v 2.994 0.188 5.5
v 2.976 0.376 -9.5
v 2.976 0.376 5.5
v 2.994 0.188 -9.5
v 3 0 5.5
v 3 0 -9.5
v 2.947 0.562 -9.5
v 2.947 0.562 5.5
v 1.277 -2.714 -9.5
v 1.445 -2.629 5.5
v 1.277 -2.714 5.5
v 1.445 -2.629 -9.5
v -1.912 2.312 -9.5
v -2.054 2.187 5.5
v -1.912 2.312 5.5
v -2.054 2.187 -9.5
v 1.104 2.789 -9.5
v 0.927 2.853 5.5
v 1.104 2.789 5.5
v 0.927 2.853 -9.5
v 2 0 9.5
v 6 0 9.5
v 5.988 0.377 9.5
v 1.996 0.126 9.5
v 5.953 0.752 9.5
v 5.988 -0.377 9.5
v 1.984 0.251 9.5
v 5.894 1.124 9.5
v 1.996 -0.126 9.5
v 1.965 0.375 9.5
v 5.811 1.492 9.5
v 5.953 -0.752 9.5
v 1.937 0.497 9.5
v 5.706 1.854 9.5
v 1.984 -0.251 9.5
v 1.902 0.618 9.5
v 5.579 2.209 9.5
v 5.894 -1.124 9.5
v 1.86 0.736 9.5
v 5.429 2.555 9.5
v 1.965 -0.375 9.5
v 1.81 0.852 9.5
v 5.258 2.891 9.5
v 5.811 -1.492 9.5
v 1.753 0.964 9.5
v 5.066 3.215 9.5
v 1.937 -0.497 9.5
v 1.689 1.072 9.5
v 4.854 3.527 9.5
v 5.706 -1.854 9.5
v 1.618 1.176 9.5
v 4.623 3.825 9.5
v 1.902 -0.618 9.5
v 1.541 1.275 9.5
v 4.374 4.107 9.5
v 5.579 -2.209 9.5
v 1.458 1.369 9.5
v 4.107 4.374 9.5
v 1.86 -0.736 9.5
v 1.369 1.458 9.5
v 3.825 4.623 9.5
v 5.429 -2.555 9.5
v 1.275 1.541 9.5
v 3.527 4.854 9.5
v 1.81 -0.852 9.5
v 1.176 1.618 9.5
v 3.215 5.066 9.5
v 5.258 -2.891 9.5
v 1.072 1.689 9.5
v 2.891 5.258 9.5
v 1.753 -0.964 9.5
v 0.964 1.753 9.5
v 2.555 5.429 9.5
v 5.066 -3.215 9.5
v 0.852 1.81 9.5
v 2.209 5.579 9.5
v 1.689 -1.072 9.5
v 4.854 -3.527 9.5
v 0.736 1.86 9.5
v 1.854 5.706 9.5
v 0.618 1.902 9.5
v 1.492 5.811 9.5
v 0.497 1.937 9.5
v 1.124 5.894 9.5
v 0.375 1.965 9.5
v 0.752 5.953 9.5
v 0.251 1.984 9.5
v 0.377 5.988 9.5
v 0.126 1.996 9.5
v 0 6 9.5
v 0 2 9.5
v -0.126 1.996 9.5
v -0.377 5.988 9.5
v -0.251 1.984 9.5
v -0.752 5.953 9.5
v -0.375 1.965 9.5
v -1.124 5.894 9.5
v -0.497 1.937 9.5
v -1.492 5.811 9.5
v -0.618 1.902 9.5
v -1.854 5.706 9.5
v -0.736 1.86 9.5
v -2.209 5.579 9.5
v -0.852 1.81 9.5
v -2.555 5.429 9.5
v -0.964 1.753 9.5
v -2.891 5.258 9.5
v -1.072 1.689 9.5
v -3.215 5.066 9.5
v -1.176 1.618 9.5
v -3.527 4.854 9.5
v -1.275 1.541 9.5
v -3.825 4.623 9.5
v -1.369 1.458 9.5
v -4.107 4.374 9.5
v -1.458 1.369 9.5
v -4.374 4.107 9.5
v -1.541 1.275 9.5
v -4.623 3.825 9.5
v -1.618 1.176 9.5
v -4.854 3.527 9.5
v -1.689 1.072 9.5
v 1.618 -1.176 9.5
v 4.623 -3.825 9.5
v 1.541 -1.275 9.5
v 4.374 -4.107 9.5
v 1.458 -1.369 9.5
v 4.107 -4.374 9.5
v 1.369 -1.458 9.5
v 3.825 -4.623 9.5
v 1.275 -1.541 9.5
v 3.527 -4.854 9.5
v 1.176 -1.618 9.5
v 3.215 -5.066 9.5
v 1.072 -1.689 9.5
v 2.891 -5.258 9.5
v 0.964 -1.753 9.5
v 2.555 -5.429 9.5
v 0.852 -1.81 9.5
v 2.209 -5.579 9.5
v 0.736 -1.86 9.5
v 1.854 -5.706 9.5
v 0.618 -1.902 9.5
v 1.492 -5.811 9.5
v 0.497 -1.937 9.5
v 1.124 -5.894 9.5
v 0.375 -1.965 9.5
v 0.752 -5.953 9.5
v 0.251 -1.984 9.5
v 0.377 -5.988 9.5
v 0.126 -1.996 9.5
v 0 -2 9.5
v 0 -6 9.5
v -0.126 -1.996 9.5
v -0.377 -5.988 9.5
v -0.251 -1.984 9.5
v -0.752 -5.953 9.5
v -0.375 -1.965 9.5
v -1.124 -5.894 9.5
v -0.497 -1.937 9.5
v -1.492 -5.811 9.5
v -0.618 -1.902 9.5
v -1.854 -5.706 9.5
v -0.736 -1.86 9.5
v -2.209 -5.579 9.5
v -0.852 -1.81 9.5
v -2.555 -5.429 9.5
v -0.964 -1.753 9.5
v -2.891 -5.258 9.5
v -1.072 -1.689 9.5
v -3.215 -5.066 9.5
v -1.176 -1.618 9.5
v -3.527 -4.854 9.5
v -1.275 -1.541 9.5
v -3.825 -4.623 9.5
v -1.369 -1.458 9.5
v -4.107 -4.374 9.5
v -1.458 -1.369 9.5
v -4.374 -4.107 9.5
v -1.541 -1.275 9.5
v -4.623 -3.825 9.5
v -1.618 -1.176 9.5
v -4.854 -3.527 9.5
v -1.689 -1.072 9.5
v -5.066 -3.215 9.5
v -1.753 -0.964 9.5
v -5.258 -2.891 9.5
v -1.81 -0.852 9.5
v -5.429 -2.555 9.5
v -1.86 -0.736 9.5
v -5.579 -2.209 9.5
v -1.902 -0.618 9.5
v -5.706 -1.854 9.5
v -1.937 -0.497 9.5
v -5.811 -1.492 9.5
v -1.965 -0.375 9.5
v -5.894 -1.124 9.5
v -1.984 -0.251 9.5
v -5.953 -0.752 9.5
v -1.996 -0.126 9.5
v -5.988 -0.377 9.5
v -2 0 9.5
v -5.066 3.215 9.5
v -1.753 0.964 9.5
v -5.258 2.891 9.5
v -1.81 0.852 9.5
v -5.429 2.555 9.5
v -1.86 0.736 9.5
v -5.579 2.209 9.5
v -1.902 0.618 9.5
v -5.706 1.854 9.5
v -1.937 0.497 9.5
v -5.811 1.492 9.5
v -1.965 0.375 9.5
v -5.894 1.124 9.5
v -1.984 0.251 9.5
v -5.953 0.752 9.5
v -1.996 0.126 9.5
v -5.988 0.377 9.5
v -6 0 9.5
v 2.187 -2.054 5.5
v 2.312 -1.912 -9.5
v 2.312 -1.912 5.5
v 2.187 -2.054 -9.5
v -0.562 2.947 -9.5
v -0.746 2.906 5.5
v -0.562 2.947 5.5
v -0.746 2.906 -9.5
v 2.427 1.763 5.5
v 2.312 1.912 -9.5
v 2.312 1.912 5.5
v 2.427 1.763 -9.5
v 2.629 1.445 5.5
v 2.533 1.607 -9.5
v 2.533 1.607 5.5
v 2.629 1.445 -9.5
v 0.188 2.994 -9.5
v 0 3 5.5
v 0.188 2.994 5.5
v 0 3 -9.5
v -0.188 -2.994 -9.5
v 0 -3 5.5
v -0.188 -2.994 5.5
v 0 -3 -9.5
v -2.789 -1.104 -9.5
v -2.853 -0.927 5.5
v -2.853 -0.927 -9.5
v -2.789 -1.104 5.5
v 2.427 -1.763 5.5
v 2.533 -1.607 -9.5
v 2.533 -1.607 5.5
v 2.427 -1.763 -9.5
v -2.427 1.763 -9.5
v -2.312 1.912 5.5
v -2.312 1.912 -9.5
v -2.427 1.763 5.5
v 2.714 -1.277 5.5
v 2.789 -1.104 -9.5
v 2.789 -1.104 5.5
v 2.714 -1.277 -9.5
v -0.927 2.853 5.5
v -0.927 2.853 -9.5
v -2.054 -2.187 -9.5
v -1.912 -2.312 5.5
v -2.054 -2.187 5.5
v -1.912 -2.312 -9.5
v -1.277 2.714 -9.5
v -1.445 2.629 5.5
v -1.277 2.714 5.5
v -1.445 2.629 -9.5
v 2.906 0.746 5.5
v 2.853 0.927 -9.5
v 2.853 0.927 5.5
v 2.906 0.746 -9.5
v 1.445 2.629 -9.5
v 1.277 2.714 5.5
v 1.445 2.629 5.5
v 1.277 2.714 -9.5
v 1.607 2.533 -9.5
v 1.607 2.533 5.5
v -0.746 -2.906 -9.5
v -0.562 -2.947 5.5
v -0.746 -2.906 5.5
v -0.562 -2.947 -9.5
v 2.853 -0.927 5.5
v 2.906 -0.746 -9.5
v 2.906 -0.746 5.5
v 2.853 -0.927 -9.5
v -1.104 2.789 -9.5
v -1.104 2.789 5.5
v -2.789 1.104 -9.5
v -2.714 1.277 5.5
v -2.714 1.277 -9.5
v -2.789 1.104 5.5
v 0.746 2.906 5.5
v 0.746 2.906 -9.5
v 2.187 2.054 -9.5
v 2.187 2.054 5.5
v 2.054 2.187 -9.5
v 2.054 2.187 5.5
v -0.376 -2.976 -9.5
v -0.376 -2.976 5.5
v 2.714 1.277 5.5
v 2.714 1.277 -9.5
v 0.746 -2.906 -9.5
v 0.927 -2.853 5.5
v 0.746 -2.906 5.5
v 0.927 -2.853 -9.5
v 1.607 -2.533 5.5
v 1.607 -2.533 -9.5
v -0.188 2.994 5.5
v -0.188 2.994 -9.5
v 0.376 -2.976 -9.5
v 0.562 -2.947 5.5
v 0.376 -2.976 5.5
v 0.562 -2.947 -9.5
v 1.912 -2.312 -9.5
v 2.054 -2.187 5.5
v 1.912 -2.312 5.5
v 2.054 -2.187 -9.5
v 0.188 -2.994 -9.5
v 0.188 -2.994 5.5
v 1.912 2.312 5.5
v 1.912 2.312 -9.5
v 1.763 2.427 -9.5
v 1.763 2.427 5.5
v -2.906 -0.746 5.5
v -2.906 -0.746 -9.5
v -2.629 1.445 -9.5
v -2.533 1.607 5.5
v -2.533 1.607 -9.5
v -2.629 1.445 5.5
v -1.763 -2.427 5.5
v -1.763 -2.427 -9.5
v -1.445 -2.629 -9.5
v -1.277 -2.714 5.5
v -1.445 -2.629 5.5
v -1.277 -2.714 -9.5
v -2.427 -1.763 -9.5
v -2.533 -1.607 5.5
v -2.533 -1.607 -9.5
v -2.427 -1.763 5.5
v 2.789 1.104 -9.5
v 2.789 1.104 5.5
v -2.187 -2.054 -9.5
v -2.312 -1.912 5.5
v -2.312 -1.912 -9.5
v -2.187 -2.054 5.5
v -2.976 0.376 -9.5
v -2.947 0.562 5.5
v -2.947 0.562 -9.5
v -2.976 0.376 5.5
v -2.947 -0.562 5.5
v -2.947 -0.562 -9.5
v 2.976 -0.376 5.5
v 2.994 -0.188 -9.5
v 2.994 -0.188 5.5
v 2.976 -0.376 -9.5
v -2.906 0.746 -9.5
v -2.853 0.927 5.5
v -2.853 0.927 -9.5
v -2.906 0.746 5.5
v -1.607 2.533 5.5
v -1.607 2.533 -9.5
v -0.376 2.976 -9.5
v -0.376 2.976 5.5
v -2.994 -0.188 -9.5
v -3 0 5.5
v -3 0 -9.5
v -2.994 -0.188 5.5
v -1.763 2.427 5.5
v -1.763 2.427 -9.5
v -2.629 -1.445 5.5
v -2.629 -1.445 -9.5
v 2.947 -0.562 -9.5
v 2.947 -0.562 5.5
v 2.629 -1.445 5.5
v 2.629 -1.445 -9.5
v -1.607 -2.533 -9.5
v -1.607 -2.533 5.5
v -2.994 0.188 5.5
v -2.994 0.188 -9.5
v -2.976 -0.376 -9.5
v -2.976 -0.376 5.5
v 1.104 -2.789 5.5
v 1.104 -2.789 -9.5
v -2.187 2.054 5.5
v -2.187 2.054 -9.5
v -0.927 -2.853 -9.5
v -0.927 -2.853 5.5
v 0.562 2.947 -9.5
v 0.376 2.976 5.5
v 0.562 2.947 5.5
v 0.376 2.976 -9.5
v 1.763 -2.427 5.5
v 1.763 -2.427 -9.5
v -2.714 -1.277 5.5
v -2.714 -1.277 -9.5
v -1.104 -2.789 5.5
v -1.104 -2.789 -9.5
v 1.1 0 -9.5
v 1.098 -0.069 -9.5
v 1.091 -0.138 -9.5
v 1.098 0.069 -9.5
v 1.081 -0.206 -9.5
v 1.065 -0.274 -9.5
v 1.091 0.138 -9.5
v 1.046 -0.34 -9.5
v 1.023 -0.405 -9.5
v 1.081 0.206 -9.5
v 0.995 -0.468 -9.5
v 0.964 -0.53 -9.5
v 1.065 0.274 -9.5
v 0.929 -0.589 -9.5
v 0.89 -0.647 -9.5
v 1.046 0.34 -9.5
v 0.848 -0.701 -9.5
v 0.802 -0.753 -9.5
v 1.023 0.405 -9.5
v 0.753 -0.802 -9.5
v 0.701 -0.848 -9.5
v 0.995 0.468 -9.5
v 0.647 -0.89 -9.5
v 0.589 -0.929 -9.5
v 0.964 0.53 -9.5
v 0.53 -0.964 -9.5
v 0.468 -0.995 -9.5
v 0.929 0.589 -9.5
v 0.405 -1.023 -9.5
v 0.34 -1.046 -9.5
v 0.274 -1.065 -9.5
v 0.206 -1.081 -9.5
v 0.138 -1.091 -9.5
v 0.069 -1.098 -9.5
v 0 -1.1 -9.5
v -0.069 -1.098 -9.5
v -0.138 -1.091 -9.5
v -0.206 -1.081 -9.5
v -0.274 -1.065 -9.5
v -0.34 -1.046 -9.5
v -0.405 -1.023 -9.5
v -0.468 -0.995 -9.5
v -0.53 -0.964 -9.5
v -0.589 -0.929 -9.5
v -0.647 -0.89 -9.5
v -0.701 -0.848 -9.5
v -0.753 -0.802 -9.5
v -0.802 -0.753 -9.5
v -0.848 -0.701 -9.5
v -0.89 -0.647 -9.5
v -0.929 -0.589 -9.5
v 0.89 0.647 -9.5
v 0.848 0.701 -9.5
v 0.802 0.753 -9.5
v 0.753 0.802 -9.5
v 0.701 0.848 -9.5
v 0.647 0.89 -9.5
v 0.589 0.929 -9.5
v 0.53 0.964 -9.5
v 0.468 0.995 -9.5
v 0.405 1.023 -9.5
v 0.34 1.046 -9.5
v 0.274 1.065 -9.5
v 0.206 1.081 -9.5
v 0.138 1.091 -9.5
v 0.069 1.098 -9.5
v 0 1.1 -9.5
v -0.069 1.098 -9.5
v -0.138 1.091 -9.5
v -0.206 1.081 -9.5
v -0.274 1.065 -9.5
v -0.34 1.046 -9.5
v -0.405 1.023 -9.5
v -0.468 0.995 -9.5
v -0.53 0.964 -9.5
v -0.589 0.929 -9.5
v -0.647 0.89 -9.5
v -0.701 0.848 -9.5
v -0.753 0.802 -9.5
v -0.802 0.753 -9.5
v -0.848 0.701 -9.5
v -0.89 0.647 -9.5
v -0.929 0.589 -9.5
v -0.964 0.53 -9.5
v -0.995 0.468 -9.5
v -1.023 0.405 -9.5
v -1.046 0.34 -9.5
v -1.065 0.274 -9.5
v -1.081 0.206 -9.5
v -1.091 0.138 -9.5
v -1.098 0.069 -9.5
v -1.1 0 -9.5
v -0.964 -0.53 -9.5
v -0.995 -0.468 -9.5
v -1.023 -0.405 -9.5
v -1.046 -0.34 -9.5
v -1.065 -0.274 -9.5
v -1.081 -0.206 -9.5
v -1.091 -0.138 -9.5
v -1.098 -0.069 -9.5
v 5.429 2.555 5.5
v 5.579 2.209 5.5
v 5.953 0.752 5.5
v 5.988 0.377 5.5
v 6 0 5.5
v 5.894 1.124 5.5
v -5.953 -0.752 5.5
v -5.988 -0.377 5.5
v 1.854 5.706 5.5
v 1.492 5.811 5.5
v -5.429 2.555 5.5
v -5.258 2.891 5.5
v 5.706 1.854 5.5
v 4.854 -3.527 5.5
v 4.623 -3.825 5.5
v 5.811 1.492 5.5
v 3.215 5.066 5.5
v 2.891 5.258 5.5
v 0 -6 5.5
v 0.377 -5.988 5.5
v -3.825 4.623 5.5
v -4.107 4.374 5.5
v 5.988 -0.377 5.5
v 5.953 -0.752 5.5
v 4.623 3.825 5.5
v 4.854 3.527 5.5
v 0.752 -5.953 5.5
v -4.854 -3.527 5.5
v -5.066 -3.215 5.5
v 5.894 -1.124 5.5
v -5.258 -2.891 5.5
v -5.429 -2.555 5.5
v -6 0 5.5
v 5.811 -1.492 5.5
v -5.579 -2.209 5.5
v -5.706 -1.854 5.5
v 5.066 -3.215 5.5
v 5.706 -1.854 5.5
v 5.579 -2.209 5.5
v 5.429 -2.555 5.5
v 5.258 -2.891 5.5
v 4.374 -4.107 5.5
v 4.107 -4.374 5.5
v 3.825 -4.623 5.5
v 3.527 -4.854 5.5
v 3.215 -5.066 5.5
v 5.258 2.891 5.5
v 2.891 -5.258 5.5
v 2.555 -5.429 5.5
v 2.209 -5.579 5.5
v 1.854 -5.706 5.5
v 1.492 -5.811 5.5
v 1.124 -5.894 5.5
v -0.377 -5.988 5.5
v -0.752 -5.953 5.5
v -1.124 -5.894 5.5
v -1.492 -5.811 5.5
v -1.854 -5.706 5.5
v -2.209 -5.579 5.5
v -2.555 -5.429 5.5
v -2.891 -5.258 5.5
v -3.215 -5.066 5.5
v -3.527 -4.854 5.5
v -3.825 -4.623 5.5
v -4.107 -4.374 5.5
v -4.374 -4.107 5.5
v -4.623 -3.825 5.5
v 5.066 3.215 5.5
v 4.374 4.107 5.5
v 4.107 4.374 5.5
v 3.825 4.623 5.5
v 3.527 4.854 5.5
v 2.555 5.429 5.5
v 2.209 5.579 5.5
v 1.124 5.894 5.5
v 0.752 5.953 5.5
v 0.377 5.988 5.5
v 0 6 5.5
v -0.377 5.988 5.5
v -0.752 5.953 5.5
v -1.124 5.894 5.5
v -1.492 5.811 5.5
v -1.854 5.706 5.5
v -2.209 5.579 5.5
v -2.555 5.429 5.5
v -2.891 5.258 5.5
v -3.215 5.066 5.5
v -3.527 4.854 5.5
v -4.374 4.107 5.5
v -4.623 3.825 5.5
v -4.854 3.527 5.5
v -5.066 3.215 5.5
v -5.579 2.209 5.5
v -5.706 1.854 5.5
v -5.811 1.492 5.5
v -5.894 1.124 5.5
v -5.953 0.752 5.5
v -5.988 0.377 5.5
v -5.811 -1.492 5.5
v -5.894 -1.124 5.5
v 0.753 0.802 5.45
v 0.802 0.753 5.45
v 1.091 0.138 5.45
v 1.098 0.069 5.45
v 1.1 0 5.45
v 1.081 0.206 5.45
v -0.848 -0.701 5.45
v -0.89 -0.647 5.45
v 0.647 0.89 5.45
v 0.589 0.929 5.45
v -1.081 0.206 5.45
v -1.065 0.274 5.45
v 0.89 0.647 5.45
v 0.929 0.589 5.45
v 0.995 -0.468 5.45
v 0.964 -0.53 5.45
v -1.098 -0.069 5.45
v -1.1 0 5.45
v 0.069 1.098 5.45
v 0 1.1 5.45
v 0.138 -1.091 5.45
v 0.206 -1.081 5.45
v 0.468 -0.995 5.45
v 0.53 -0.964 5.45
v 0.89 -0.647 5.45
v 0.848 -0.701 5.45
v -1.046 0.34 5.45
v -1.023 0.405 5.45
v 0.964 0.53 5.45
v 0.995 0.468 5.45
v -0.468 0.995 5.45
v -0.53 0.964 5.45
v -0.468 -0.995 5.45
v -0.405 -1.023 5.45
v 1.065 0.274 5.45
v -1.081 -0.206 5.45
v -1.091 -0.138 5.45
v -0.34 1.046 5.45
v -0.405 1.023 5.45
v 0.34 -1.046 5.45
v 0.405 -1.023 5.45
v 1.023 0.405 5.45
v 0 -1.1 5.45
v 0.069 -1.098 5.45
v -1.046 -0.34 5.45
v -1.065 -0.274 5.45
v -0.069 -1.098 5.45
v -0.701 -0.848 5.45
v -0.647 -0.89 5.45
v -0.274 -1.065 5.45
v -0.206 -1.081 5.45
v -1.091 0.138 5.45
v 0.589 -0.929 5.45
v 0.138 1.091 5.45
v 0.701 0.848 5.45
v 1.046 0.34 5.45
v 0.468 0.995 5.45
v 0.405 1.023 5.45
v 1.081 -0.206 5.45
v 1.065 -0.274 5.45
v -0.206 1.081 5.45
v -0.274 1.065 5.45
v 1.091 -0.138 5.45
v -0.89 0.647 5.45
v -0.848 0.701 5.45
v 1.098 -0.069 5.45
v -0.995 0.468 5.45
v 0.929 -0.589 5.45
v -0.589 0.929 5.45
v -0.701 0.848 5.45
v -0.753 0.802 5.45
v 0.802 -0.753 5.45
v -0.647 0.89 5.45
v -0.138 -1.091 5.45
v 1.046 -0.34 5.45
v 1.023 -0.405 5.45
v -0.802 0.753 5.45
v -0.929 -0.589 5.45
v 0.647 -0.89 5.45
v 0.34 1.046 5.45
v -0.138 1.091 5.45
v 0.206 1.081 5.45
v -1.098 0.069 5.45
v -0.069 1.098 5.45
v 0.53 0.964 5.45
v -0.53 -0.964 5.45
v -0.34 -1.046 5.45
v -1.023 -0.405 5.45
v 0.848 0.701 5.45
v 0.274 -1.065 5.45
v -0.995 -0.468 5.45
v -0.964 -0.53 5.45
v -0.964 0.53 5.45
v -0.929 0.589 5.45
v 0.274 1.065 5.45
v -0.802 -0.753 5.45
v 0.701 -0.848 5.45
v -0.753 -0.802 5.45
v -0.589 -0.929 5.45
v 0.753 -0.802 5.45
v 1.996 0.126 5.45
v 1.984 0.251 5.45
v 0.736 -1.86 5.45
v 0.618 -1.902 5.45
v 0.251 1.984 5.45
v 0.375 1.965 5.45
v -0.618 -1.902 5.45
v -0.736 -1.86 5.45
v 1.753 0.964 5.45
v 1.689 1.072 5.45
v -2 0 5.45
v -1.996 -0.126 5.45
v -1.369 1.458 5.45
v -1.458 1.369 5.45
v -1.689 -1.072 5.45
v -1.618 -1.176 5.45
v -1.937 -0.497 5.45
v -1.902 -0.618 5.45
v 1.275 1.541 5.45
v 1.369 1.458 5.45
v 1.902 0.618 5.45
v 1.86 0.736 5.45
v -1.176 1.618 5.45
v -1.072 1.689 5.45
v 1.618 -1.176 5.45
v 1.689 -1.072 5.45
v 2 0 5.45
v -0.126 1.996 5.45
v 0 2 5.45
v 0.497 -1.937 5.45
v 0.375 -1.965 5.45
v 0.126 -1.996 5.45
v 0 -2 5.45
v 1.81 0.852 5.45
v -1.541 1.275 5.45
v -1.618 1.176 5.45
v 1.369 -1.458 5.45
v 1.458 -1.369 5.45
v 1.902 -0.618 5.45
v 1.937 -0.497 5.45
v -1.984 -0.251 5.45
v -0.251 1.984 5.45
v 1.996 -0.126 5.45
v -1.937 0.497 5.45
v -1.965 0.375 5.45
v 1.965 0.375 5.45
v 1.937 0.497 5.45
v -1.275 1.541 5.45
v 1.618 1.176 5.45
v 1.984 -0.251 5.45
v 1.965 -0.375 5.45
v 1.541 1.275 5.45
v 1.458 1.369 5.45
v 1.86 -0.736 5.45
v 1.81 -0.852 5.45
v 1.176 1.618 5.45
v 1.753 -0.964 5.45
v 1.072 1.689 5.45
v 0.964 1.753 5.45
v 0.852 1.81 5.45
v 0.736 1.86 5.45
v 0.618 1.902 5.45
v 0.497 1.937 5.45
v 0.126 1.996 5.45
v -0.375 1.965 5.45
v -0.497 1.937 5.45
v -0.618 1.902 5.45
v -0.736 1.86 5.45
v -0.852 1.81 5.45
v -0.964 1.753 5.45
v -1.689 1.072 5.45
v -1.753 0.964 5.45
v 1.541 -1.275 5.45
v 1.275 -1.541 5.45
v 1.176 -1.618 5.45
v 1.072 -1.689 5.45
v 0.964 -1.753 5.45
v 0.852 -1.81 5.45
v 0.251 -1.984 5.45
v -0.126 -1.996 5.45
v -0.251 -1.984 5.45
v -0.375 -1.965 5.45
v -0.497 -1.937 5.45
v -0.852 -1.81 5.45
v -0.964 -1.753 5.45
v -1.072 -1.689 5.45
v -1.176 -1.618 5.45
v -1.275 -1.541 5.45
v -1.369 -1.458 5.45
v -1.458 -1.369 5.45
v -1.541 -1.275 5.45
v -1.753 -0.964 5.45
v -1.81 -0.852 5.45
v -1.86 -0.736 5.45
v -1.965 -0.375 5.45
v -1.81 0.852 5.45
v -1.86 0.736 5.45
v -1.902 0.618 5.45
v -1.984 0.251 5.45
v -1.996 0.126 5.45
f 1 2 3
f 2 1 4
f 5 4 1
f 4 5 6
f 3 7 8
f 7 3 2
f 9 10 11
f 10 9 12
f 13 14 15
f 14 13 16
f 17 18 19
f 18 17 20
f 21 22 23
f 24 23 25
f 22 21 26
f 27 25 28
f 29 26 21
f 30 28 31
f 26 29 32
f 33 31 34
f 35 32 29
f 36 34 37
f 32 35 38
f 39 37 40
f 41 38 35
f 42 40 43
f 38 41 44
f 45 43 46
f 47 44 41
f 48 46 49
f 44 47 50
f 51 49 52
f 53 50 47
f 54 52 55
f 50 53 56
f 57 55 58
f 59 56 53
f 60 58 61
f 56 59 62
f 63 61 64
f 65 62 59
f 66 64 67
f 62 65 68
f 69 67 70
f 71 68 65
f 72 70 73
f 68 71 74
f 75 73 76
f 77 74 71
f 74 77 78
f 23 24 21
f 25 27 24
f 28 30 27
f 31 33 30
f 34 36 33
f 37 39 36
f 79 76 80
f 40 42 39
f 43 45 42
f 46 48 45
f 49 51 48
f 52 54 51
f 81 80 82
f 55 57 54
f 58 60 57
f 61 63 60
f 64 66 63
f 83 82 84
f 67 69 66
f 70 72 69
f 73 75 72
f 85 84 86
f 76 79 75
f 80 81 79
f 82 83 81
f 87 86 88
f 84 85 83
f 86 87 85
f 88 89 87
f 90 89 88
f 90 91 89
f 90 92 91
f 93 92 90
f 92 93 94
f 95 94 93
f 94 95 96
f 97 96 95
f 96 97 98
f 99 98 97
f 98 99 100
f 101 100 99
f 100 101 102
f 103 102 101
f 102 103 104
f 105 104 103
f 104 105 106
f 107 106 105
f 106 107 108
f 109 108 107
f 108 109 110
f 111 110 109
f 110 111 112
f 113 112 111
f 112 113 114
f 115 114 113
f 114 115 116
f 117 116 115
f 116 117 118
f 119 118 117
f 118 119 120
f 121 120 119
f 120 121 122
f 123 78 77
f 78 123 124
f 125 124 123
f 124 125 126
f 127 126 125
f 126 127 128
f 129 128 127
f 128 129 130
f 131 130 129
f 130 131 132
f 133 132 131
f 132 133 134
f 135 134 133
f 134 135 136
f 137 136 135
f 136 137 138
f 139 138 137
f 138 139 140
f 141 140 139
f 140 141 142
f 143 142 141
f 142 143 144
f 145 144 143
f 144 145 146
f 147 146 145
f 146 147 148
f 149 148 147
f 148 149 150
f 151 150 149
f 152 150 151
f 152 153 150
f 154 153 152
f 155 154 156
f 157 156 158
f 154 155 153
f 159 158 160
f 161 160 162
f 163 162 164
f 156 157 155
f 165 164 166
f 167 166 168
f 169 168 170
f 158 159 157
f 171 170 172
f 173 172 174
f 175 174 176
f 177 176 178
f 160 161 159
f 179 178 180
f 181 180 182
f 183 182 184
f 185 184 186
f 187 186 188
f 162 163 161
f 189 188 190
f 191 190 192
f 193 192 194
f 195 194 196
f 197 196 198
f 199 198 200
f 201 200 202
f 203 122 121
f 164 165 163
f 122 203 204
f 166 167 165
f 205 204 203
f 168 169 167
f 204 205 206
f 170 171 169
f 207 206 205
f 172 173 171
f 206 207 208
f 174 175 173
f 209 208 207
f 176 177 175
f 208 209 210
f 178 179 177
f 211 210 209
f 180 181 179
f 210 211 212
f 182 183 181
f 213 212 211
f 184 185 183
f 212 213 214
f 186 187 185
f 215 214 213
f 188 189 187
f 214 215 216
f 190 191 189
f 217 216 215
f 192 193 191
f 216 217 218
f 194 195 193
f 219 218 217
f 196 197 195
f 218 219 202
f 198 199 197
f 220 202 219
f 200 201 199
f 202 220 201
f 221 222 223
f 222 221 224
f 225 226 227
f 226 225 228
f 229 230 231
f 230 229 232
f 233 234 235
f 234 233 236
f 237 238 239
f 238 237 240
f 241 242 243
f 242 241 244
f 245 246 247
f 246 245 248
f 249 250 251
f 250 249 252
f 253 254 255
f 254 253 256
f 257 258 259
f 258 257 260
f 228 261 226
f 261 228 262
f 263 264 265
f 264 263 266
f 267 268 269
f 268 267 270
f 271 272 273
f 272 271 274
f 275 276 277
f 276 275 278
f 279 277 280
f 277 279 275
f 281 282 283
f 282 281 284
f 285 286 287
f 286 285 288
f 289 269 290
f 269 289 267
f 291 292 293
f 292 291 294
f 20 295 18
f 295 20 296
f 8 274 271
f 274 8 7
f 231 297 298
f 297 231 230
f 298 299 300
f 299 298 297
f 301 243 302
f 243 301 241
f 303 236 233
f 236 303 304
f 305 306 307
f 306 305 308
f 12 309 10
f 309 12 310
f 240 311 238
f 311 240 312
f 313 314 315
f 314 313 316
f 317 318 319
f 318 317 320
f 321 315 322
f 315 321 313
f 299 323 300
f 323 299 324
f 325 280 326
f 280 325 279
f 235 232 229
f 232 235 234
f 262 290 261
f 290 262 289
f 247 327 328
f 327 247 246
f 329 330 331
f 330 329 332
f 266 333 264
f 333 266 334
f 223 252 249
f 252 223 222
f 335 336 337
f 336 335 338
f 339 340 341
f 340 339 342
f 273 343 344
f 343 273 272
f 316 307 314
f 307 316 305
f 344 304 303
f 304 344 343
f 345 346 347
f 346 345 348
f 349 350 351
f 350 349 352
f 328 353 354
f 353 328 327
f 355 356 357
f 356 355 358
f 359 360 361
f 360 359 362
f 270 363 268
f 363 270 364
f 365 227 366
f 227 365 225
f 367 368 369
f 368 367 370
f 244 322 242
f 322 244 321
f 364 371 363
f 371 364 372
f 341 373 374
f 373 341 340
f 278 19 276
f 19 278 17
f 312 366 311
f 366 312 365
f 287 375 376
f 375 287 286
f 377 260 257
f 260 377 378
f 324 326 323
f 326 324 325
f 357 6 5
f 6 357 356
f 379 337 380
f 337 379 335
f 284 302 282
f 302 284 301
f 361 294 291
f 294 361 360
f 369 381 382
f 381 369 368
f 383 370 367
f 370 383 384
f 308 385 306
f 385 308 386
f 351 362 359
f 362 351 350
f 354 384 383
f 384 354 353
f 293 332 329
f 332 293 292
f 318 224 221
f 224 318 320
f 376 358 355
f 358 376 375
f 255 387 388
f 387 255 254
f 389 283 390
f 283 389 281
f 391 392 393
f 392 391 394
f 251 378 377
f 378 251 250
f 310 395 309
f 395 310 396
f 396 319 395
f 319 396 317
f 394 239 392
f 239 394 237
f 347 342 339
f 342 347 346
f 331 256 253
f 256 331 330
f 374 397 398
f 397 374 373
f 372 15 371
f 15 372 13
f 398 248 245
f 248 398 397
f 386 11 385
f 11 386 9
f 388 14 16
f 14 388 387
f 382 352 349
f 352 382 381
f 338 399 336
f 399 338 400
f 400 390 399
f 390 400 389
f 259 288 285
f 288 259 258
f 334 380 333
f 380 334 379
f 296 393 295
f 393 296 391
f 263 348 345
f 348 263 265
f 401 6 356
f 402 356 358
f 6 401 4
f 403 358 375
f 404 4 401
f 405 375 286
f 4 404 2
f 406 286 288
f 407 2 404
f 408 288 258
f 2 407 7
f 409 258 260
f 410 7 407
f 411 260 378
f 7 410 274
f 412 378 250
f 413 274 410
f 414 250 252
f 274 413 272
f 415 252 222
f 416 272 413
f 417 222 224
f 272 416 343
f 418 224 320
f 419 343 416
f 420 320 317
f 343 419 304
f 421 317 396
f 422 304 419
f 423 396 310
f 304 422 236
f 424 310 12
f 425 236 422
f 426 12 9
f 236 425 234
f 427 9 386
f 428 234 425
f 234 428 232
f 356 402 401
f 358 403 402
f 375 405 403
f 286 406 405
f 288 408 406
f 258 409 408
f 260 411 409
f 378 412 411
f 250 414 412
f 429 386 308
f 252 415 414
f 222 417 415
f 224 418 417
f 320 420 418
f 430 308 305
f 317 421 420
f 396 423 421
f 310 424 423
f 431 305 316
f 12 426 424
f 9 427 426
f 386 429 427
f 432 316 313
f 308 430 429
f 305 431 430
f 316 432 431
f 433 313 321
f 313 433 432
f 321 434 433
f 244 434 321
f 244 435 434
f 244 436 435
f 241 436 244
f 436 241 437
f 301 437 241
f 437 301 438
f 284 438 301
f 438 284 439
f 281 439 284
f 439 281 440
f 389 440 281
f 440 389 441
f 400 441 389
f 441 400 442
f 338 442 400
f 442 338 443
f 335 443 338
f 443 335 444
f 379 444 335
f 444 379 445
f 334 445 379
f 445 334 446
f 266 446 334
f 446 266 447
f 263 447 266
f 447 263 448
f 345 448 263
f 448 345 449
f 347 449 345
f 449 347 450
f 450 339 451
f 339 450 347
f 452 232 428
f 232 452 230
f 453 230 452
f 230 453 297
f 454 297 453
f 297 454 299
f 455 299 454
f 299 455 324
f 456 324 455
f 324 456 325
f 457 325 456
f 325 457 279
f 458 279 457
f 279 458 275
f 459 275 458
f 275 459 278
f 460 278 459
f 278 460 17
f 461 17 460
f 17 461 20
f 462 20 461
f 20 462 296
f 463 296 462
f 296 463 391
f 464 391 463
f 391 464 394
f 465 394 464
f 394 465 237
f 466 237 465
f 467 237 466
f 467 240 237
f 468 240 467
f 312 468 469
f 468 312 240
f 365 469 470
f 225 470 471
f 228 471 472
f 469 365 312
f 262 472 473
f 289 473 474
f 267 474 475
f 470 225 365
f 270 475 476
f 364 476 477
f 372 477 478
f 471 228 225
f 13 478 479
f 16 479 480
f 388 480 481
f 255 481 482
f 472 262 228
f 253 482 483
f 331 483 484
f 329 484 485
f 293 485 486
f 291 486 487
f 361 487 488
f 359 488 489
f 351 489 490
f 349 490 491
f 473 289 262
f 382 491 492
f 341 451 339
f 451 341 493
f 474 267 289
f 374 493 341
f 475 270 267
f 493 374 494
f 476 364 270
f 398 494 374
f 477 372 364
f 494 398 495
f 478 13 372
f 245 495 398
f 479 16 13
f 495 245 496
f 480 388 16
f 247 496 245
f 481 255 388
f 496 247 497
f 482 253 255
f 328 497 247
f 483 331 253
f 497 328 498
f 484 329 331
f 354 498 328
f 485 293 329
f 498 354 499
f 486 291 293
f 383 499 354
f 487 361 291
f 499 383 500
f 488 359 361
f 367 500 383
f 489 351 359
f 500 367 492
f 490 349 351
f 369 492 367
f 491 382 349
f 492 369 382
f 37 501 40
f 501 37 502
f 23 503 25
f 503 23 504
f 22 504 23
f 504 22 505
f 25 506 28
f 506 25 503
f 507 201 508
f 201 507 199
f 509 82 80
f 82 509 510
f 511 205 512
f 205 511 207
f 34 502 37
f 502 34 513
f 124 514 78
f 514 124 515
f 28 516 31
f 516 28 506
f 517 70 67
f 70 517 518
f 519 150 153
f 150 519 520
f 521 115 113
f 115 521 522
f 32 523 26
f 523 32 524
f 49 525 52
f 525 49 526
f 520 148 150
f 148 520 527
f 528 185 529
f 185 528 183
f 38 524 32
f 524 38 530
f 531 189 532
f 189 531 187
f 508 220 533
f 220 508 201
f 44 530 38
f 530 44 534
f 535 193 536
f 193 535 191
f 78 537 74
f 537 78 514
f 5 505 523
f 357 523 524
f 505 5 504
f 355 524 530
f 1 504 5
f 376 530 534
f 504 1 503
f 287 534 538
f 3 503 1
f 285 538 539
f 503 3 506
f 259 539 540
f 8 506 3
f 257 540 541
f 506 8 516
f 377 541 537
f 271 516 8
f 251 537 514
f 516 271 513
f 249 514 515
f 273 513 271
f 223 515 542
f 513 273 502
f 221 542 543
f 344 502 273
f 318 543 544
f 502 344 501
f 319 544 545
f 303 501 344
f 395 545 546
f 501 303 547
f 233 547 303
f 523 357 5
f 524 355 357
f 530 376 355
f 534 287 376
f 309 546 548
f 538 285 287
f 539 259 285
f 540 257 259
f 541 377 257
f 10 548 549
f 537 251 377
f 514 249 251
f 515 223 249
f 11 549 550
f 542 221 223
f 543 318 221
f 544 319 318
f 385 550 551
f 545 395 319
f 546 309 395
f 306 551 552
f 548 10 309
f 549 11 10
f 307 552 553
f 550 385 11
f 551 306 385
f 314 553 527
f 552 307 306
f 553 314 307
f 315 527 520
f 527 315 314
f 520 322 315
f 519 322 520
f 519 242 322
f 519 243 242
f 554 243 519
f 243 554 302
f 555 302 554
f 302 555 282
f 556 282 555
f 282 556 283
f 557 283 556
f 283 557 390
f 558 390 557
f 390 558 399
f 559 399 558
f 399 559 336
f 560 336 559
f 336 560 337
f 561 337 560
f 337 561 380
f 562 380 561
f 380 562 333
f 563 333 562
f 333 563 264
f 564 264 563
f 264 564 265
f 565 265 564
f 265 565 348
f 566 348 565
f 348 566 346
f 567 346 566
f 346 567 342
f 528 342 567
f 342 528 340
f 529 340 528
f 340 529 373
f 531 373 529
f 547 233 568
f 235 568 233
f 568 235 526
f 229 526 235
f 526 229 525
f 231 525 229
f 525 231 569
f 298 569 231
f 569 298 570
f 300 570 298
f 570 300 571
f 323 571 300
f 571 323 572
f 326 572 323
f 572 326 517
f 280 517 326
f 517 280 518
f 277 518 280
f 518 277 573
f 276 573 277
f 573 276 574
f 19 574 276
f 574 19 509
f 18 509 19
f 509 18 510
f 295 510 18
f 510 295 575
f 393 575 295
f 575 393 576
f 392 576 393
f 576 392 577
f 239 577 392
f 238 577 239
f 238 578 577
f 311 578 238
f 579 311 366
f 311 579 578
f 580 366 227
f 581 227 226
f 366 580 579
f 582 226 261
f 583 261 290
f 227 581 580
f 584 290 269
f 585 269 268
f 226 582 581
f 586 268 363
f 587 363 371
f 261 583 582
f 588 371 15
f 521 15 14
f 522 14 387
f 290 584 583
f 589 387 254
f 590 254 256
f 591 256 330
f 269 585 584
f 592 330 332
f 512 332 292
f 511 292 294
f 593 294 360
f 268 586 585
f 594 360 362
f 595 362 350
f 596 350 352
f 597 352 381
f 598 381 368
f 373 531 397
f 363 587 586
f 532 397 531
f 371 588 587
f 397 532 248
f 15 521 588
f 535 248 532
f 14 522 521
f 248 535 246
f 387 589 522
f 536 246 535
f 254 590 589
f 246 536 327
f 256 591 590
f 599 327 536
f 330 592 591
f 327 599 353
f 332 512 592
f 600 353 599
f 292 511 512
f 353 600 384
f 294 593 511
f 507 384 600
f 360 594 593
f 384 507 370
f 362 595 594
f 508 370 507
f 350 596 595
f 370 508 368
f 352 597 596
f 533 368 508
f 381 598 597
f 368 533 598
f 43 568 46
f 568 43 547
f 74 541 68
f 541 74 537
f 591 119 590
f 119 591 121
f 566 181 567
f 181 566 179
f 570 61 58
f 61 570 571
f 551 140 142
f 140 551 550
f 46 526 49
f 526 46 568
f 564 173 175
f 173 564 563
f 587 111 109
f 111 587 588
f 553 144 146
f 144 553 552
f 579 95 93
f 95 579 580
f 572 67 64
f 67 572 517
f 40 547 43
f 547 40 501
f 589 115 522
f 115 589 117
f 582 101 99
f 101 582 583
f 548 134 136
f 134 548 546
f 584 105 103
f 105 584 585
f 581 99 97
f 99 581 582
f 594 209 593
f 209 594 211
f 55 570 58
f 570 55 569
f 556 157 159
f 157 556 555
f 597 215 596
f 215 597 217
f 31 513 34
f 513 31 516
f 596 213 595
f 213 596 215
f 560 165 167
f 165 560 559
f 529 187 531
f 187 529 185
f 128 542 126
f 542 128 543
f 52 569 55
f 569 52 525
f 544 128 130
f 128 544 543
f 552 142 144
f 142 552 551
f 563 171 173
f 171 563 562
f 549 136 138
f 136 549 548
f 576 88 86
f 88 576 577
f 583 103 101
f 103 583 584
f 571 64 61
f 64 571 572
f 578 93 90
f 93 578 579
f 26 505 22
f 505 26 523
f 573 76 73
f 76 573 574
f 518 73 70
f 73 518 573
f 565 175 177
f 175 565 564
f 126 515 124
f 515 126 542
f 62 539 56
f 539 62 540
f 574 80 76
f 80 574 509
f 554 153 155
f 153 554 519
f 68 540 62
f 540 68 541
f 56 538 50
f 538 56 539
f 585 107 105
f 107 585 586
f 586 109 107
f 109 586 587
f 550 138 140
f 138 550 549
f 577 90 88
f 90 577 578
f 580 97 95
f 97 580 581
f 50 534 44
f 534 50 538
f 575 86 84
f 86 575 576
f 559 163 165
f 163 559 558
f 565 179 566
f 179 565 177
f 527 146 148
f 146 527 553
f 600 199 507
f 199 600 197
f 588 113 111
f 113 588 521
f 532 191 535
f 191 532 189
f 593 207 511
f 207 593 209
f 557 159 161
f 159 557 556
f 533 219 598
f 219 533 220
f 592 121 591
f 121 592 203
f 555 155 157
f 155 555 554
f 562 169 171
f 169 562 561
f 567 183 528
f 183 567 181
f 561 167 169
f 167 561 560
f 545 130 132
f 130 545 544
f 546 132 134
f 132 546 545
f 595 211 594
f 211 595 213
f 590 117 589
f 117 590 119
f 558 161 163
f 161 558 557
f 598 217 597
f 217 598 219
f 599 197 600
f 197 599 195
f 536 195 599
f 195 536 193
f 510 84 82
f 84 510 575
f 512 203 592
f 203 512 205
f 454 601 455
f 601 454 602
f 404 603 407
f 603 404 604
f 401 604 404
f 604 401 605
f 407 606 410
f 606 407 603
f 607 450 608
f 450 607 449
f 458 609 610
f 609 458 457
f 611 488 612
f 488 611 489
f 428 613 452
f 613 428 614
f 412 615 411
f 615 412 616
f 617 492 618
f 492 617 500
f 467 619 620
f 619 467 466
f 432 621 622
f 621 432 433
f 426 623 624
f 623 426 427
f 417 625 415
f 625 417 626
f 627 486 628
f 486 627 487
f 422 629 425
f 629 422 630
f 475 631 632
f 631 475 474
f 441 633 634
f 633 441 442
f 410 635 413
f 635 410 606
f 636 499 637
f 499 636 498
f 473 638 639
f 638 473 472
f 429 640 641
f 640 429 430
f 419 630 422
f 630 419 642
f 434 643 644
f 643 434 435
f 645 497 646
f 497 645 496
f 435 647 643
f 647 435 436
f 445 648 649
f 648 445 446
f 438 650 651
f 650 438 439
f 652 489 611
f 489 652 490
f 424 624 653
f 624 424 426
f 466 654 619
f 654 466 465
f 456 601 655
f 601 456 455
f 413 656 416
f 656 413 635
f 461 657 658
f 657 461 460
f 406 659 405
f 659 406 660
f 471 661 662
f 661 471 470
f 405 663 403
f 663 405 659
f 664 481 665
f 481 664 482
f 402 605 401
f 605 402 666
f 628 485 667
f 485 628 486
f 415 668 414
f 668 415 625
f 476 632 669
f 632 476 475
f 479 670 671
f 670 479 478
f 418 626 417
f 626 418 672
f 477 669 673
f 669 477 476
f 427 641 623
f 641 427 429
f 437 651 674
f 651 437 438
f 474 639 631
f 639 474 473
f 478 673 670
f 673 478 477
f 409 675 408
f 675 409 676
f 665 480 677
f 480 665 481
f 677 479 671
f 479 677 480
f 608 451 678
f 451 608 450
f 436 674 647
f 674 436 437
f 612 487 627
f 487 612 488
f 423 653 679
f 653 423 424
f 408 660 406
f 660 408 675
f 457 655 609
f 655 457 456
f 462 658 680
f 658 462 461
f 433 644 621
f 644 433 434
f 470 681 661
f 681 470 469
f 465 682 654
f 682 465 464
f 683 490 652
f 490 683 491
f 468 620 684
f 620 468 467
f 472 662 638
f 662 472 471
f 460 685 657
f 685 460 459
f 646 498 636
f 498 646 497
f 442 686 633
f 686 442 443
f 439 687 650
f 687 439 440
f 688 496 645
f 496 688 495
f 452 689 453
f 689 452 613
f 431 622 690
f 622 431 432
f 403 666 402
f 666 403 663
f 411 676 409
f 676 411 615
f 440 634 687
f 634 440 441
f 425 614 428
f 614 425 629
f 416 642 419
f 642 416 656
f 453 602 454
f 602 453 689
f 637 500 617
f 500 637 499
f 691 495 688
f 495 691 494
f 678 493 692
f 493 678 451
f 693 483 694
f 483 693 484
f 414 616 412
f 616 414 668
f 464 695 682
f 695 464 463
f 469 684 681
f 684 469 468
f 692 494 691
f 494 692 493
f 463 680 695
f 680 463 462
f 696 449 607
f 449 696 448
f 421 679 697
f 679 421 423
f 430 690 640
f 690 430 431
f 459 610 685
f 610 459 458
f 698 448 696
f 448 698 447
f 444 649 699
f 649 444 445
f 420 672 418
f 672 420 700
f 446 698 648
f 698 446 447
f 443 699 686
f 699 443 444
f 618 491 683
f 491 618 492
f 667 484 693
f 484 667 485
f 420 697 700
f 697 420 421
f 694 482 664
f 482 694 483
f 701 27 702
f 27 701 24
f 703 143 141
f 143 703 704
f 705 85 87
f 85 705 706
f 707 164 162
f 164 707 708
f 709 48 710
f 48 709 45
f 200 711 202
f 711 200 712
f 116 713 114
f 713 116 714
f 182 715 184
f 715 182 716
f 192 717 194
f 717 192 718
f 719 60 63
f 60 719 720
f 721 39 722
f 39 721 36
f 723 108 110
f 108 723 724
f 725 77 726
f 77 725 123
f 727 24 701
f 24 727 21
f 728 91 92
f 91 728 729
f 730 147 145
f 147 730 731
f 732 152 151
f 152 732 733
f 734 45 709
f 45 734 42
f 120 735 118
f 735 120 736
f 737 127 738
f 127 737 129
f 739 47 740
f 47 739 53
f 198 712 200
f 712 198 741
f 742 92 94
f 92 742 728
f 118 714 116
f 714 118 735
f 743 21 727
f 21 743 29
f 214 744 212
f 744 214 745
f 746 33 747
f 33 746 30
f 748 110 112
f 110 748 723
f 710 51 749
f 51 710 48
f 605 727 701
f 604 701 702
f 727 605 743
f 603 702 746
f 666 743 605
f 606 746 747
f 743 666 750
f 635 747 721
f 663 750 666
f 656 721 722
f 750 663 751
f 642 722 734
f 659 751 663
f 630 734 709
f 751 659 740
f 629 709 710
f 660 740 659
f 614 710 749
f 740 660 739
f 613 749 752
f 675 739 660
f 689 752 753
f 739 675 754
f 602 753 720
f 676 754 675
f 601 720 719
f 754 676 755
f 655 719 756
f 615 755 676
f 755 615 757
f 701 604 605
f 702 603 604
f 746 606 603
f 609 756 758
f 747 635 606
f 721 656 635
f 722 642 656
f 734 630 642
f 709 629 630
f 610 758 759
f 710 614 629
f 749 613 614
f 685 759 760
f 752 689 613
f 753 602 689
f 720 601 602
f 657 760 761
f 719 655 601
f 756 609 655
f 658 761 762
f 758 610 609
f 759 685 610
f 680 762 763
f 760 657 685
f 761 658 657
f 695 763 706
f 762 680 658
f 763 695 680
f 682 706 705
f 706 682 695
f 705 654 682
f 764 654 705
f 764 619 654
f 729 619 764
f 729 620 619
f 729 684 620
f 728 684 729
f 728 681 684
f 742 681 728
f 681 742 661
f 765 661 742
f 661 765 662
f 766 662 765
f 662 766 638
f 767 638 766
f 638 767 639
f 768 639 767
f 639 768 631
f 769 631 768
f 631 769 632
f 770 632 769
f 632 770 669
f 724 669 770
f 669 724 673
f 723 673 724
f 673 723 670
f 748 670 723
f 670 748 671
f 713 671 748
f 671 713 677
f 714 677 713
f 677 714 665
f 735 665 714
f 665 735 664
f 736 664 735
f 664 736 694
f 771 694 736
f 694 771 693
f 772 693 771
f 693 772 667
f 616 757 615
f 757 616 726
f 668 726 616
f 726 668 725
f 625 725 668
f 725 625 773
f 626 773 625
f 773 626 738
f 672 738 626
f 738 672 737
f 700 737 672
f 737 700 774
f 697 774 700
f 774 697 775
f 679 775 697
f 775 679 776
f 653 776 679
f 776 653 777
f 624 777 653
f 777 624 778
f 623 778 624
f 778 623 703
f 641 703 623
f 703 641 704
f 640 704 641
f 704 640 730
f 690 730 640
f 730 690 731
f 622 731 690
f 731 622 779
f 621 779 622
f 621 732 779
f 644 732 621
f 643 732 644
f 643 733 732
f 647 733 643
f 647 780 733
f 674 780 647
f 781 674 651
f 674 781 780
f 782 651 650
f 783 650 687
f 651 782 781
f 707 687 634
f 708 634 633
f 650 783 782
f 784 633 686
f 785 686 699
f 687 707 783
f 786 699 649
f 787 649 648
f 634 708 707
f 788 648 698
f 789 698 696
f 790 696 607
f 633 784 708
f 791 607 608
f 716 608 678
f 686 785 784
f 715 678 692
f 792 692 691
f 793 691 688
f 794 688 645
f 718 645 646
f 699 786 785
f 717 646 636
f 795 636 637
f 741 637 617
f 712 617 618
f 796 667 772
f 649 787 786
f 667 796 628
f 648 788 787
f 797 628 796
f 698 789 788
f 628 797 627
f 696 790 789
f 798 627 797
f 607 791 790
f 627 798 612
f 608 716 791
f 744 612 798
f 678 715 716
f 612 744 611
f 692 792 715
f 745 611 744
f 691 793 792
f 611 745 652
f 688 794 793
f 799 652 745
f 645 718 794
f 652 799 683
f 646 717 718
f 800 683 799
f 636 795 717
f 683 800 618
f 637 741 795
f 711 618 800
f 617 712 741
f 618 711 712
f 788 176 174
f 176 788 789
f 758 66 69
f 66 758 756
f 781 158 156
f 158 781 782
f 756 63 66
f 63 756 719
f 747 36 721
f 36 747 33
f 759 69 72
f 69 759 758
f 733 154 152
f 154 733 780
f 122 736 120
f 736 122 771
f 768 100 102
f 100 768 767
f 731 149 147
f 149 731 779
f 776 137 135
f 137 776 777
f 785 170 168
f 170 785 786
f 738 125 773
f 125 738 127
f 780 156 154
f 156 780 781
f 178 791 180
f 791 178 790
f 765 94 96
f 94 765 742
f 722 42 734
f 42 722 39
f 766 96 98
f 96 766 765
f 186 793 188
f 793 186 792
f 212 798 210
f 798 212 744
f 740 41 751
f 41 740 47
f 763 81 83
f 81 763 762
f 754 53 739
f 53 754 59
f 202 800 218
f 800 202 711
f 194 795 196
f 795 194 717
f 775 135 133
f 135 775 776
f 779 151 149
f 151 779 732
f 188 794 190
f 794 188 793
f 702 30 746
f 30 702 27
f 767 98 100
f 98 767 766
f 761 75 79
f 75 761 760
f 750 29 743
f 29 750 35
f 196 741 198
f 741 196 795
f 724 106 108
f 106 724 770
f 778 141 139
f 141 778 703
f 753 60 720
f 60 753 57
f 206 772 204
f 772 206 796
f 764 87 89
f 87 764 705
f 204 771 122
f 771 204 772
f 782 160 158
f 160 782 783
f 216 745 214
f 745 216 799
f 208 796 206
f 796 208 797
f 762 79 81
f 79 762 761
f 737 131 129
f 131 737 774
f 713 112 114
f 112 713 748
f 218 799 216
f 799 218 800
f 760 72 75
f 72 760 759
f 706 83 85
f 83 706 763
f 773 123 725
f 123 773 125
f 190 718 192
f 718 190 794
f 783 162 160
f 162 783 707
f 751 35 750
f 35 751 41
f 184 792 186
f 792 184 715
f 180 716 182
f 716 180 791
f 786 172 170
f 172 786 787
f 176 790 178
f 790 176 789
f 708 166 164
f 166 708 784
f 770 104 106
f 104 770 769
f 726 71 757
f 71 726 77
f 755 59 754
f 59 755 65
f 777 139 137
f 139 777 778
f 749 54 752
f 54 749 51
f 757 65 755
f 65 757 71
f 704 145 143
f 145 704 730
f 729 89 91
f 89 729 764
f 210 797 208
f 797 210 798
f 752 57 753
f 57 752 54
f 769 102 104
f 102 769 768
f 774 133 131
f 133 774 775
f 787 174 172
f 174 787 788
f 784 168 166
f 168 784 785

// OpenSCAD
//============================================================
// Pathé Baby
//	Axe de roue d'embobinage
// Vincent DUBOIS
//============================================================

//------------------------------------------------------------
// Parameters in millimeter - Recommended values see comment
//------------------------------------------------------------
$fn = 100 ;		//
Thikness = 4 ;		// 2 <=> 5
Epsilon = 0.1 ;	// par definition Printer resolution

// Longueur de l'axe
Axe_Height = 19;

// longueur de la vis interne


// Trou pour la vis
Axe_Internal_Hole_Diameter = 2;
Axe_Internal_Hole_Radius = Axe_Internal_Hole_Diameter/2;

// Diamètre externe de l'axe
Axe_External_Diameter = 6;
Axe_External_Radius = Axe_External_Diameter/2;

// Têt de l'axe
Axe_Head_Height = 4;
Axe_Head_Diameter = 12;
Axe_Head_Radius = Axe_Head_Diameter/2;

// Trou de tête pour la vis cf. longueur de la vis...
Axe_Head_Hole_Diameter = 4;
Axe_Head_Hole_Radius = Axe_Head_Hole_Diameter/2;

//------------------------------------------------------------
// Axe de roue
//------------------------------------------------------------
module Axe_Wheel()
{

	difference()
	{
		union()
		{
			cylinder
			(
				r=Axe_External_Radius,
				h=Axe_Height,
				center=true
			);
			translate([0,0,(Axe_Height-Axe_Head_Height)/2])
				cylinder
				(
					r=Axe_Head_Radius,
					h=Axe_Head_Height,
					center=true
				);
		}

		// passage de la vis
		cylinder
		(
			r=Axe_Internal_Hole_Radius+Epsilon,
			h=Axe_Height+Epsilon,
			center=true
		);

		// pour la tête de vis
		translate([0,0,(Axe_Height-Axe_Head_Height)/2])
			cylinder
			(
				r=Axe_Head_Hole_Radius,
				h=Axe_Head_Height+Epsilon,
				center=true
			);
	}
}

//------------------------------------------------------------
// View
//------------------------------------------------------------

Axe_Wheel();


//==EOF=======================================================
